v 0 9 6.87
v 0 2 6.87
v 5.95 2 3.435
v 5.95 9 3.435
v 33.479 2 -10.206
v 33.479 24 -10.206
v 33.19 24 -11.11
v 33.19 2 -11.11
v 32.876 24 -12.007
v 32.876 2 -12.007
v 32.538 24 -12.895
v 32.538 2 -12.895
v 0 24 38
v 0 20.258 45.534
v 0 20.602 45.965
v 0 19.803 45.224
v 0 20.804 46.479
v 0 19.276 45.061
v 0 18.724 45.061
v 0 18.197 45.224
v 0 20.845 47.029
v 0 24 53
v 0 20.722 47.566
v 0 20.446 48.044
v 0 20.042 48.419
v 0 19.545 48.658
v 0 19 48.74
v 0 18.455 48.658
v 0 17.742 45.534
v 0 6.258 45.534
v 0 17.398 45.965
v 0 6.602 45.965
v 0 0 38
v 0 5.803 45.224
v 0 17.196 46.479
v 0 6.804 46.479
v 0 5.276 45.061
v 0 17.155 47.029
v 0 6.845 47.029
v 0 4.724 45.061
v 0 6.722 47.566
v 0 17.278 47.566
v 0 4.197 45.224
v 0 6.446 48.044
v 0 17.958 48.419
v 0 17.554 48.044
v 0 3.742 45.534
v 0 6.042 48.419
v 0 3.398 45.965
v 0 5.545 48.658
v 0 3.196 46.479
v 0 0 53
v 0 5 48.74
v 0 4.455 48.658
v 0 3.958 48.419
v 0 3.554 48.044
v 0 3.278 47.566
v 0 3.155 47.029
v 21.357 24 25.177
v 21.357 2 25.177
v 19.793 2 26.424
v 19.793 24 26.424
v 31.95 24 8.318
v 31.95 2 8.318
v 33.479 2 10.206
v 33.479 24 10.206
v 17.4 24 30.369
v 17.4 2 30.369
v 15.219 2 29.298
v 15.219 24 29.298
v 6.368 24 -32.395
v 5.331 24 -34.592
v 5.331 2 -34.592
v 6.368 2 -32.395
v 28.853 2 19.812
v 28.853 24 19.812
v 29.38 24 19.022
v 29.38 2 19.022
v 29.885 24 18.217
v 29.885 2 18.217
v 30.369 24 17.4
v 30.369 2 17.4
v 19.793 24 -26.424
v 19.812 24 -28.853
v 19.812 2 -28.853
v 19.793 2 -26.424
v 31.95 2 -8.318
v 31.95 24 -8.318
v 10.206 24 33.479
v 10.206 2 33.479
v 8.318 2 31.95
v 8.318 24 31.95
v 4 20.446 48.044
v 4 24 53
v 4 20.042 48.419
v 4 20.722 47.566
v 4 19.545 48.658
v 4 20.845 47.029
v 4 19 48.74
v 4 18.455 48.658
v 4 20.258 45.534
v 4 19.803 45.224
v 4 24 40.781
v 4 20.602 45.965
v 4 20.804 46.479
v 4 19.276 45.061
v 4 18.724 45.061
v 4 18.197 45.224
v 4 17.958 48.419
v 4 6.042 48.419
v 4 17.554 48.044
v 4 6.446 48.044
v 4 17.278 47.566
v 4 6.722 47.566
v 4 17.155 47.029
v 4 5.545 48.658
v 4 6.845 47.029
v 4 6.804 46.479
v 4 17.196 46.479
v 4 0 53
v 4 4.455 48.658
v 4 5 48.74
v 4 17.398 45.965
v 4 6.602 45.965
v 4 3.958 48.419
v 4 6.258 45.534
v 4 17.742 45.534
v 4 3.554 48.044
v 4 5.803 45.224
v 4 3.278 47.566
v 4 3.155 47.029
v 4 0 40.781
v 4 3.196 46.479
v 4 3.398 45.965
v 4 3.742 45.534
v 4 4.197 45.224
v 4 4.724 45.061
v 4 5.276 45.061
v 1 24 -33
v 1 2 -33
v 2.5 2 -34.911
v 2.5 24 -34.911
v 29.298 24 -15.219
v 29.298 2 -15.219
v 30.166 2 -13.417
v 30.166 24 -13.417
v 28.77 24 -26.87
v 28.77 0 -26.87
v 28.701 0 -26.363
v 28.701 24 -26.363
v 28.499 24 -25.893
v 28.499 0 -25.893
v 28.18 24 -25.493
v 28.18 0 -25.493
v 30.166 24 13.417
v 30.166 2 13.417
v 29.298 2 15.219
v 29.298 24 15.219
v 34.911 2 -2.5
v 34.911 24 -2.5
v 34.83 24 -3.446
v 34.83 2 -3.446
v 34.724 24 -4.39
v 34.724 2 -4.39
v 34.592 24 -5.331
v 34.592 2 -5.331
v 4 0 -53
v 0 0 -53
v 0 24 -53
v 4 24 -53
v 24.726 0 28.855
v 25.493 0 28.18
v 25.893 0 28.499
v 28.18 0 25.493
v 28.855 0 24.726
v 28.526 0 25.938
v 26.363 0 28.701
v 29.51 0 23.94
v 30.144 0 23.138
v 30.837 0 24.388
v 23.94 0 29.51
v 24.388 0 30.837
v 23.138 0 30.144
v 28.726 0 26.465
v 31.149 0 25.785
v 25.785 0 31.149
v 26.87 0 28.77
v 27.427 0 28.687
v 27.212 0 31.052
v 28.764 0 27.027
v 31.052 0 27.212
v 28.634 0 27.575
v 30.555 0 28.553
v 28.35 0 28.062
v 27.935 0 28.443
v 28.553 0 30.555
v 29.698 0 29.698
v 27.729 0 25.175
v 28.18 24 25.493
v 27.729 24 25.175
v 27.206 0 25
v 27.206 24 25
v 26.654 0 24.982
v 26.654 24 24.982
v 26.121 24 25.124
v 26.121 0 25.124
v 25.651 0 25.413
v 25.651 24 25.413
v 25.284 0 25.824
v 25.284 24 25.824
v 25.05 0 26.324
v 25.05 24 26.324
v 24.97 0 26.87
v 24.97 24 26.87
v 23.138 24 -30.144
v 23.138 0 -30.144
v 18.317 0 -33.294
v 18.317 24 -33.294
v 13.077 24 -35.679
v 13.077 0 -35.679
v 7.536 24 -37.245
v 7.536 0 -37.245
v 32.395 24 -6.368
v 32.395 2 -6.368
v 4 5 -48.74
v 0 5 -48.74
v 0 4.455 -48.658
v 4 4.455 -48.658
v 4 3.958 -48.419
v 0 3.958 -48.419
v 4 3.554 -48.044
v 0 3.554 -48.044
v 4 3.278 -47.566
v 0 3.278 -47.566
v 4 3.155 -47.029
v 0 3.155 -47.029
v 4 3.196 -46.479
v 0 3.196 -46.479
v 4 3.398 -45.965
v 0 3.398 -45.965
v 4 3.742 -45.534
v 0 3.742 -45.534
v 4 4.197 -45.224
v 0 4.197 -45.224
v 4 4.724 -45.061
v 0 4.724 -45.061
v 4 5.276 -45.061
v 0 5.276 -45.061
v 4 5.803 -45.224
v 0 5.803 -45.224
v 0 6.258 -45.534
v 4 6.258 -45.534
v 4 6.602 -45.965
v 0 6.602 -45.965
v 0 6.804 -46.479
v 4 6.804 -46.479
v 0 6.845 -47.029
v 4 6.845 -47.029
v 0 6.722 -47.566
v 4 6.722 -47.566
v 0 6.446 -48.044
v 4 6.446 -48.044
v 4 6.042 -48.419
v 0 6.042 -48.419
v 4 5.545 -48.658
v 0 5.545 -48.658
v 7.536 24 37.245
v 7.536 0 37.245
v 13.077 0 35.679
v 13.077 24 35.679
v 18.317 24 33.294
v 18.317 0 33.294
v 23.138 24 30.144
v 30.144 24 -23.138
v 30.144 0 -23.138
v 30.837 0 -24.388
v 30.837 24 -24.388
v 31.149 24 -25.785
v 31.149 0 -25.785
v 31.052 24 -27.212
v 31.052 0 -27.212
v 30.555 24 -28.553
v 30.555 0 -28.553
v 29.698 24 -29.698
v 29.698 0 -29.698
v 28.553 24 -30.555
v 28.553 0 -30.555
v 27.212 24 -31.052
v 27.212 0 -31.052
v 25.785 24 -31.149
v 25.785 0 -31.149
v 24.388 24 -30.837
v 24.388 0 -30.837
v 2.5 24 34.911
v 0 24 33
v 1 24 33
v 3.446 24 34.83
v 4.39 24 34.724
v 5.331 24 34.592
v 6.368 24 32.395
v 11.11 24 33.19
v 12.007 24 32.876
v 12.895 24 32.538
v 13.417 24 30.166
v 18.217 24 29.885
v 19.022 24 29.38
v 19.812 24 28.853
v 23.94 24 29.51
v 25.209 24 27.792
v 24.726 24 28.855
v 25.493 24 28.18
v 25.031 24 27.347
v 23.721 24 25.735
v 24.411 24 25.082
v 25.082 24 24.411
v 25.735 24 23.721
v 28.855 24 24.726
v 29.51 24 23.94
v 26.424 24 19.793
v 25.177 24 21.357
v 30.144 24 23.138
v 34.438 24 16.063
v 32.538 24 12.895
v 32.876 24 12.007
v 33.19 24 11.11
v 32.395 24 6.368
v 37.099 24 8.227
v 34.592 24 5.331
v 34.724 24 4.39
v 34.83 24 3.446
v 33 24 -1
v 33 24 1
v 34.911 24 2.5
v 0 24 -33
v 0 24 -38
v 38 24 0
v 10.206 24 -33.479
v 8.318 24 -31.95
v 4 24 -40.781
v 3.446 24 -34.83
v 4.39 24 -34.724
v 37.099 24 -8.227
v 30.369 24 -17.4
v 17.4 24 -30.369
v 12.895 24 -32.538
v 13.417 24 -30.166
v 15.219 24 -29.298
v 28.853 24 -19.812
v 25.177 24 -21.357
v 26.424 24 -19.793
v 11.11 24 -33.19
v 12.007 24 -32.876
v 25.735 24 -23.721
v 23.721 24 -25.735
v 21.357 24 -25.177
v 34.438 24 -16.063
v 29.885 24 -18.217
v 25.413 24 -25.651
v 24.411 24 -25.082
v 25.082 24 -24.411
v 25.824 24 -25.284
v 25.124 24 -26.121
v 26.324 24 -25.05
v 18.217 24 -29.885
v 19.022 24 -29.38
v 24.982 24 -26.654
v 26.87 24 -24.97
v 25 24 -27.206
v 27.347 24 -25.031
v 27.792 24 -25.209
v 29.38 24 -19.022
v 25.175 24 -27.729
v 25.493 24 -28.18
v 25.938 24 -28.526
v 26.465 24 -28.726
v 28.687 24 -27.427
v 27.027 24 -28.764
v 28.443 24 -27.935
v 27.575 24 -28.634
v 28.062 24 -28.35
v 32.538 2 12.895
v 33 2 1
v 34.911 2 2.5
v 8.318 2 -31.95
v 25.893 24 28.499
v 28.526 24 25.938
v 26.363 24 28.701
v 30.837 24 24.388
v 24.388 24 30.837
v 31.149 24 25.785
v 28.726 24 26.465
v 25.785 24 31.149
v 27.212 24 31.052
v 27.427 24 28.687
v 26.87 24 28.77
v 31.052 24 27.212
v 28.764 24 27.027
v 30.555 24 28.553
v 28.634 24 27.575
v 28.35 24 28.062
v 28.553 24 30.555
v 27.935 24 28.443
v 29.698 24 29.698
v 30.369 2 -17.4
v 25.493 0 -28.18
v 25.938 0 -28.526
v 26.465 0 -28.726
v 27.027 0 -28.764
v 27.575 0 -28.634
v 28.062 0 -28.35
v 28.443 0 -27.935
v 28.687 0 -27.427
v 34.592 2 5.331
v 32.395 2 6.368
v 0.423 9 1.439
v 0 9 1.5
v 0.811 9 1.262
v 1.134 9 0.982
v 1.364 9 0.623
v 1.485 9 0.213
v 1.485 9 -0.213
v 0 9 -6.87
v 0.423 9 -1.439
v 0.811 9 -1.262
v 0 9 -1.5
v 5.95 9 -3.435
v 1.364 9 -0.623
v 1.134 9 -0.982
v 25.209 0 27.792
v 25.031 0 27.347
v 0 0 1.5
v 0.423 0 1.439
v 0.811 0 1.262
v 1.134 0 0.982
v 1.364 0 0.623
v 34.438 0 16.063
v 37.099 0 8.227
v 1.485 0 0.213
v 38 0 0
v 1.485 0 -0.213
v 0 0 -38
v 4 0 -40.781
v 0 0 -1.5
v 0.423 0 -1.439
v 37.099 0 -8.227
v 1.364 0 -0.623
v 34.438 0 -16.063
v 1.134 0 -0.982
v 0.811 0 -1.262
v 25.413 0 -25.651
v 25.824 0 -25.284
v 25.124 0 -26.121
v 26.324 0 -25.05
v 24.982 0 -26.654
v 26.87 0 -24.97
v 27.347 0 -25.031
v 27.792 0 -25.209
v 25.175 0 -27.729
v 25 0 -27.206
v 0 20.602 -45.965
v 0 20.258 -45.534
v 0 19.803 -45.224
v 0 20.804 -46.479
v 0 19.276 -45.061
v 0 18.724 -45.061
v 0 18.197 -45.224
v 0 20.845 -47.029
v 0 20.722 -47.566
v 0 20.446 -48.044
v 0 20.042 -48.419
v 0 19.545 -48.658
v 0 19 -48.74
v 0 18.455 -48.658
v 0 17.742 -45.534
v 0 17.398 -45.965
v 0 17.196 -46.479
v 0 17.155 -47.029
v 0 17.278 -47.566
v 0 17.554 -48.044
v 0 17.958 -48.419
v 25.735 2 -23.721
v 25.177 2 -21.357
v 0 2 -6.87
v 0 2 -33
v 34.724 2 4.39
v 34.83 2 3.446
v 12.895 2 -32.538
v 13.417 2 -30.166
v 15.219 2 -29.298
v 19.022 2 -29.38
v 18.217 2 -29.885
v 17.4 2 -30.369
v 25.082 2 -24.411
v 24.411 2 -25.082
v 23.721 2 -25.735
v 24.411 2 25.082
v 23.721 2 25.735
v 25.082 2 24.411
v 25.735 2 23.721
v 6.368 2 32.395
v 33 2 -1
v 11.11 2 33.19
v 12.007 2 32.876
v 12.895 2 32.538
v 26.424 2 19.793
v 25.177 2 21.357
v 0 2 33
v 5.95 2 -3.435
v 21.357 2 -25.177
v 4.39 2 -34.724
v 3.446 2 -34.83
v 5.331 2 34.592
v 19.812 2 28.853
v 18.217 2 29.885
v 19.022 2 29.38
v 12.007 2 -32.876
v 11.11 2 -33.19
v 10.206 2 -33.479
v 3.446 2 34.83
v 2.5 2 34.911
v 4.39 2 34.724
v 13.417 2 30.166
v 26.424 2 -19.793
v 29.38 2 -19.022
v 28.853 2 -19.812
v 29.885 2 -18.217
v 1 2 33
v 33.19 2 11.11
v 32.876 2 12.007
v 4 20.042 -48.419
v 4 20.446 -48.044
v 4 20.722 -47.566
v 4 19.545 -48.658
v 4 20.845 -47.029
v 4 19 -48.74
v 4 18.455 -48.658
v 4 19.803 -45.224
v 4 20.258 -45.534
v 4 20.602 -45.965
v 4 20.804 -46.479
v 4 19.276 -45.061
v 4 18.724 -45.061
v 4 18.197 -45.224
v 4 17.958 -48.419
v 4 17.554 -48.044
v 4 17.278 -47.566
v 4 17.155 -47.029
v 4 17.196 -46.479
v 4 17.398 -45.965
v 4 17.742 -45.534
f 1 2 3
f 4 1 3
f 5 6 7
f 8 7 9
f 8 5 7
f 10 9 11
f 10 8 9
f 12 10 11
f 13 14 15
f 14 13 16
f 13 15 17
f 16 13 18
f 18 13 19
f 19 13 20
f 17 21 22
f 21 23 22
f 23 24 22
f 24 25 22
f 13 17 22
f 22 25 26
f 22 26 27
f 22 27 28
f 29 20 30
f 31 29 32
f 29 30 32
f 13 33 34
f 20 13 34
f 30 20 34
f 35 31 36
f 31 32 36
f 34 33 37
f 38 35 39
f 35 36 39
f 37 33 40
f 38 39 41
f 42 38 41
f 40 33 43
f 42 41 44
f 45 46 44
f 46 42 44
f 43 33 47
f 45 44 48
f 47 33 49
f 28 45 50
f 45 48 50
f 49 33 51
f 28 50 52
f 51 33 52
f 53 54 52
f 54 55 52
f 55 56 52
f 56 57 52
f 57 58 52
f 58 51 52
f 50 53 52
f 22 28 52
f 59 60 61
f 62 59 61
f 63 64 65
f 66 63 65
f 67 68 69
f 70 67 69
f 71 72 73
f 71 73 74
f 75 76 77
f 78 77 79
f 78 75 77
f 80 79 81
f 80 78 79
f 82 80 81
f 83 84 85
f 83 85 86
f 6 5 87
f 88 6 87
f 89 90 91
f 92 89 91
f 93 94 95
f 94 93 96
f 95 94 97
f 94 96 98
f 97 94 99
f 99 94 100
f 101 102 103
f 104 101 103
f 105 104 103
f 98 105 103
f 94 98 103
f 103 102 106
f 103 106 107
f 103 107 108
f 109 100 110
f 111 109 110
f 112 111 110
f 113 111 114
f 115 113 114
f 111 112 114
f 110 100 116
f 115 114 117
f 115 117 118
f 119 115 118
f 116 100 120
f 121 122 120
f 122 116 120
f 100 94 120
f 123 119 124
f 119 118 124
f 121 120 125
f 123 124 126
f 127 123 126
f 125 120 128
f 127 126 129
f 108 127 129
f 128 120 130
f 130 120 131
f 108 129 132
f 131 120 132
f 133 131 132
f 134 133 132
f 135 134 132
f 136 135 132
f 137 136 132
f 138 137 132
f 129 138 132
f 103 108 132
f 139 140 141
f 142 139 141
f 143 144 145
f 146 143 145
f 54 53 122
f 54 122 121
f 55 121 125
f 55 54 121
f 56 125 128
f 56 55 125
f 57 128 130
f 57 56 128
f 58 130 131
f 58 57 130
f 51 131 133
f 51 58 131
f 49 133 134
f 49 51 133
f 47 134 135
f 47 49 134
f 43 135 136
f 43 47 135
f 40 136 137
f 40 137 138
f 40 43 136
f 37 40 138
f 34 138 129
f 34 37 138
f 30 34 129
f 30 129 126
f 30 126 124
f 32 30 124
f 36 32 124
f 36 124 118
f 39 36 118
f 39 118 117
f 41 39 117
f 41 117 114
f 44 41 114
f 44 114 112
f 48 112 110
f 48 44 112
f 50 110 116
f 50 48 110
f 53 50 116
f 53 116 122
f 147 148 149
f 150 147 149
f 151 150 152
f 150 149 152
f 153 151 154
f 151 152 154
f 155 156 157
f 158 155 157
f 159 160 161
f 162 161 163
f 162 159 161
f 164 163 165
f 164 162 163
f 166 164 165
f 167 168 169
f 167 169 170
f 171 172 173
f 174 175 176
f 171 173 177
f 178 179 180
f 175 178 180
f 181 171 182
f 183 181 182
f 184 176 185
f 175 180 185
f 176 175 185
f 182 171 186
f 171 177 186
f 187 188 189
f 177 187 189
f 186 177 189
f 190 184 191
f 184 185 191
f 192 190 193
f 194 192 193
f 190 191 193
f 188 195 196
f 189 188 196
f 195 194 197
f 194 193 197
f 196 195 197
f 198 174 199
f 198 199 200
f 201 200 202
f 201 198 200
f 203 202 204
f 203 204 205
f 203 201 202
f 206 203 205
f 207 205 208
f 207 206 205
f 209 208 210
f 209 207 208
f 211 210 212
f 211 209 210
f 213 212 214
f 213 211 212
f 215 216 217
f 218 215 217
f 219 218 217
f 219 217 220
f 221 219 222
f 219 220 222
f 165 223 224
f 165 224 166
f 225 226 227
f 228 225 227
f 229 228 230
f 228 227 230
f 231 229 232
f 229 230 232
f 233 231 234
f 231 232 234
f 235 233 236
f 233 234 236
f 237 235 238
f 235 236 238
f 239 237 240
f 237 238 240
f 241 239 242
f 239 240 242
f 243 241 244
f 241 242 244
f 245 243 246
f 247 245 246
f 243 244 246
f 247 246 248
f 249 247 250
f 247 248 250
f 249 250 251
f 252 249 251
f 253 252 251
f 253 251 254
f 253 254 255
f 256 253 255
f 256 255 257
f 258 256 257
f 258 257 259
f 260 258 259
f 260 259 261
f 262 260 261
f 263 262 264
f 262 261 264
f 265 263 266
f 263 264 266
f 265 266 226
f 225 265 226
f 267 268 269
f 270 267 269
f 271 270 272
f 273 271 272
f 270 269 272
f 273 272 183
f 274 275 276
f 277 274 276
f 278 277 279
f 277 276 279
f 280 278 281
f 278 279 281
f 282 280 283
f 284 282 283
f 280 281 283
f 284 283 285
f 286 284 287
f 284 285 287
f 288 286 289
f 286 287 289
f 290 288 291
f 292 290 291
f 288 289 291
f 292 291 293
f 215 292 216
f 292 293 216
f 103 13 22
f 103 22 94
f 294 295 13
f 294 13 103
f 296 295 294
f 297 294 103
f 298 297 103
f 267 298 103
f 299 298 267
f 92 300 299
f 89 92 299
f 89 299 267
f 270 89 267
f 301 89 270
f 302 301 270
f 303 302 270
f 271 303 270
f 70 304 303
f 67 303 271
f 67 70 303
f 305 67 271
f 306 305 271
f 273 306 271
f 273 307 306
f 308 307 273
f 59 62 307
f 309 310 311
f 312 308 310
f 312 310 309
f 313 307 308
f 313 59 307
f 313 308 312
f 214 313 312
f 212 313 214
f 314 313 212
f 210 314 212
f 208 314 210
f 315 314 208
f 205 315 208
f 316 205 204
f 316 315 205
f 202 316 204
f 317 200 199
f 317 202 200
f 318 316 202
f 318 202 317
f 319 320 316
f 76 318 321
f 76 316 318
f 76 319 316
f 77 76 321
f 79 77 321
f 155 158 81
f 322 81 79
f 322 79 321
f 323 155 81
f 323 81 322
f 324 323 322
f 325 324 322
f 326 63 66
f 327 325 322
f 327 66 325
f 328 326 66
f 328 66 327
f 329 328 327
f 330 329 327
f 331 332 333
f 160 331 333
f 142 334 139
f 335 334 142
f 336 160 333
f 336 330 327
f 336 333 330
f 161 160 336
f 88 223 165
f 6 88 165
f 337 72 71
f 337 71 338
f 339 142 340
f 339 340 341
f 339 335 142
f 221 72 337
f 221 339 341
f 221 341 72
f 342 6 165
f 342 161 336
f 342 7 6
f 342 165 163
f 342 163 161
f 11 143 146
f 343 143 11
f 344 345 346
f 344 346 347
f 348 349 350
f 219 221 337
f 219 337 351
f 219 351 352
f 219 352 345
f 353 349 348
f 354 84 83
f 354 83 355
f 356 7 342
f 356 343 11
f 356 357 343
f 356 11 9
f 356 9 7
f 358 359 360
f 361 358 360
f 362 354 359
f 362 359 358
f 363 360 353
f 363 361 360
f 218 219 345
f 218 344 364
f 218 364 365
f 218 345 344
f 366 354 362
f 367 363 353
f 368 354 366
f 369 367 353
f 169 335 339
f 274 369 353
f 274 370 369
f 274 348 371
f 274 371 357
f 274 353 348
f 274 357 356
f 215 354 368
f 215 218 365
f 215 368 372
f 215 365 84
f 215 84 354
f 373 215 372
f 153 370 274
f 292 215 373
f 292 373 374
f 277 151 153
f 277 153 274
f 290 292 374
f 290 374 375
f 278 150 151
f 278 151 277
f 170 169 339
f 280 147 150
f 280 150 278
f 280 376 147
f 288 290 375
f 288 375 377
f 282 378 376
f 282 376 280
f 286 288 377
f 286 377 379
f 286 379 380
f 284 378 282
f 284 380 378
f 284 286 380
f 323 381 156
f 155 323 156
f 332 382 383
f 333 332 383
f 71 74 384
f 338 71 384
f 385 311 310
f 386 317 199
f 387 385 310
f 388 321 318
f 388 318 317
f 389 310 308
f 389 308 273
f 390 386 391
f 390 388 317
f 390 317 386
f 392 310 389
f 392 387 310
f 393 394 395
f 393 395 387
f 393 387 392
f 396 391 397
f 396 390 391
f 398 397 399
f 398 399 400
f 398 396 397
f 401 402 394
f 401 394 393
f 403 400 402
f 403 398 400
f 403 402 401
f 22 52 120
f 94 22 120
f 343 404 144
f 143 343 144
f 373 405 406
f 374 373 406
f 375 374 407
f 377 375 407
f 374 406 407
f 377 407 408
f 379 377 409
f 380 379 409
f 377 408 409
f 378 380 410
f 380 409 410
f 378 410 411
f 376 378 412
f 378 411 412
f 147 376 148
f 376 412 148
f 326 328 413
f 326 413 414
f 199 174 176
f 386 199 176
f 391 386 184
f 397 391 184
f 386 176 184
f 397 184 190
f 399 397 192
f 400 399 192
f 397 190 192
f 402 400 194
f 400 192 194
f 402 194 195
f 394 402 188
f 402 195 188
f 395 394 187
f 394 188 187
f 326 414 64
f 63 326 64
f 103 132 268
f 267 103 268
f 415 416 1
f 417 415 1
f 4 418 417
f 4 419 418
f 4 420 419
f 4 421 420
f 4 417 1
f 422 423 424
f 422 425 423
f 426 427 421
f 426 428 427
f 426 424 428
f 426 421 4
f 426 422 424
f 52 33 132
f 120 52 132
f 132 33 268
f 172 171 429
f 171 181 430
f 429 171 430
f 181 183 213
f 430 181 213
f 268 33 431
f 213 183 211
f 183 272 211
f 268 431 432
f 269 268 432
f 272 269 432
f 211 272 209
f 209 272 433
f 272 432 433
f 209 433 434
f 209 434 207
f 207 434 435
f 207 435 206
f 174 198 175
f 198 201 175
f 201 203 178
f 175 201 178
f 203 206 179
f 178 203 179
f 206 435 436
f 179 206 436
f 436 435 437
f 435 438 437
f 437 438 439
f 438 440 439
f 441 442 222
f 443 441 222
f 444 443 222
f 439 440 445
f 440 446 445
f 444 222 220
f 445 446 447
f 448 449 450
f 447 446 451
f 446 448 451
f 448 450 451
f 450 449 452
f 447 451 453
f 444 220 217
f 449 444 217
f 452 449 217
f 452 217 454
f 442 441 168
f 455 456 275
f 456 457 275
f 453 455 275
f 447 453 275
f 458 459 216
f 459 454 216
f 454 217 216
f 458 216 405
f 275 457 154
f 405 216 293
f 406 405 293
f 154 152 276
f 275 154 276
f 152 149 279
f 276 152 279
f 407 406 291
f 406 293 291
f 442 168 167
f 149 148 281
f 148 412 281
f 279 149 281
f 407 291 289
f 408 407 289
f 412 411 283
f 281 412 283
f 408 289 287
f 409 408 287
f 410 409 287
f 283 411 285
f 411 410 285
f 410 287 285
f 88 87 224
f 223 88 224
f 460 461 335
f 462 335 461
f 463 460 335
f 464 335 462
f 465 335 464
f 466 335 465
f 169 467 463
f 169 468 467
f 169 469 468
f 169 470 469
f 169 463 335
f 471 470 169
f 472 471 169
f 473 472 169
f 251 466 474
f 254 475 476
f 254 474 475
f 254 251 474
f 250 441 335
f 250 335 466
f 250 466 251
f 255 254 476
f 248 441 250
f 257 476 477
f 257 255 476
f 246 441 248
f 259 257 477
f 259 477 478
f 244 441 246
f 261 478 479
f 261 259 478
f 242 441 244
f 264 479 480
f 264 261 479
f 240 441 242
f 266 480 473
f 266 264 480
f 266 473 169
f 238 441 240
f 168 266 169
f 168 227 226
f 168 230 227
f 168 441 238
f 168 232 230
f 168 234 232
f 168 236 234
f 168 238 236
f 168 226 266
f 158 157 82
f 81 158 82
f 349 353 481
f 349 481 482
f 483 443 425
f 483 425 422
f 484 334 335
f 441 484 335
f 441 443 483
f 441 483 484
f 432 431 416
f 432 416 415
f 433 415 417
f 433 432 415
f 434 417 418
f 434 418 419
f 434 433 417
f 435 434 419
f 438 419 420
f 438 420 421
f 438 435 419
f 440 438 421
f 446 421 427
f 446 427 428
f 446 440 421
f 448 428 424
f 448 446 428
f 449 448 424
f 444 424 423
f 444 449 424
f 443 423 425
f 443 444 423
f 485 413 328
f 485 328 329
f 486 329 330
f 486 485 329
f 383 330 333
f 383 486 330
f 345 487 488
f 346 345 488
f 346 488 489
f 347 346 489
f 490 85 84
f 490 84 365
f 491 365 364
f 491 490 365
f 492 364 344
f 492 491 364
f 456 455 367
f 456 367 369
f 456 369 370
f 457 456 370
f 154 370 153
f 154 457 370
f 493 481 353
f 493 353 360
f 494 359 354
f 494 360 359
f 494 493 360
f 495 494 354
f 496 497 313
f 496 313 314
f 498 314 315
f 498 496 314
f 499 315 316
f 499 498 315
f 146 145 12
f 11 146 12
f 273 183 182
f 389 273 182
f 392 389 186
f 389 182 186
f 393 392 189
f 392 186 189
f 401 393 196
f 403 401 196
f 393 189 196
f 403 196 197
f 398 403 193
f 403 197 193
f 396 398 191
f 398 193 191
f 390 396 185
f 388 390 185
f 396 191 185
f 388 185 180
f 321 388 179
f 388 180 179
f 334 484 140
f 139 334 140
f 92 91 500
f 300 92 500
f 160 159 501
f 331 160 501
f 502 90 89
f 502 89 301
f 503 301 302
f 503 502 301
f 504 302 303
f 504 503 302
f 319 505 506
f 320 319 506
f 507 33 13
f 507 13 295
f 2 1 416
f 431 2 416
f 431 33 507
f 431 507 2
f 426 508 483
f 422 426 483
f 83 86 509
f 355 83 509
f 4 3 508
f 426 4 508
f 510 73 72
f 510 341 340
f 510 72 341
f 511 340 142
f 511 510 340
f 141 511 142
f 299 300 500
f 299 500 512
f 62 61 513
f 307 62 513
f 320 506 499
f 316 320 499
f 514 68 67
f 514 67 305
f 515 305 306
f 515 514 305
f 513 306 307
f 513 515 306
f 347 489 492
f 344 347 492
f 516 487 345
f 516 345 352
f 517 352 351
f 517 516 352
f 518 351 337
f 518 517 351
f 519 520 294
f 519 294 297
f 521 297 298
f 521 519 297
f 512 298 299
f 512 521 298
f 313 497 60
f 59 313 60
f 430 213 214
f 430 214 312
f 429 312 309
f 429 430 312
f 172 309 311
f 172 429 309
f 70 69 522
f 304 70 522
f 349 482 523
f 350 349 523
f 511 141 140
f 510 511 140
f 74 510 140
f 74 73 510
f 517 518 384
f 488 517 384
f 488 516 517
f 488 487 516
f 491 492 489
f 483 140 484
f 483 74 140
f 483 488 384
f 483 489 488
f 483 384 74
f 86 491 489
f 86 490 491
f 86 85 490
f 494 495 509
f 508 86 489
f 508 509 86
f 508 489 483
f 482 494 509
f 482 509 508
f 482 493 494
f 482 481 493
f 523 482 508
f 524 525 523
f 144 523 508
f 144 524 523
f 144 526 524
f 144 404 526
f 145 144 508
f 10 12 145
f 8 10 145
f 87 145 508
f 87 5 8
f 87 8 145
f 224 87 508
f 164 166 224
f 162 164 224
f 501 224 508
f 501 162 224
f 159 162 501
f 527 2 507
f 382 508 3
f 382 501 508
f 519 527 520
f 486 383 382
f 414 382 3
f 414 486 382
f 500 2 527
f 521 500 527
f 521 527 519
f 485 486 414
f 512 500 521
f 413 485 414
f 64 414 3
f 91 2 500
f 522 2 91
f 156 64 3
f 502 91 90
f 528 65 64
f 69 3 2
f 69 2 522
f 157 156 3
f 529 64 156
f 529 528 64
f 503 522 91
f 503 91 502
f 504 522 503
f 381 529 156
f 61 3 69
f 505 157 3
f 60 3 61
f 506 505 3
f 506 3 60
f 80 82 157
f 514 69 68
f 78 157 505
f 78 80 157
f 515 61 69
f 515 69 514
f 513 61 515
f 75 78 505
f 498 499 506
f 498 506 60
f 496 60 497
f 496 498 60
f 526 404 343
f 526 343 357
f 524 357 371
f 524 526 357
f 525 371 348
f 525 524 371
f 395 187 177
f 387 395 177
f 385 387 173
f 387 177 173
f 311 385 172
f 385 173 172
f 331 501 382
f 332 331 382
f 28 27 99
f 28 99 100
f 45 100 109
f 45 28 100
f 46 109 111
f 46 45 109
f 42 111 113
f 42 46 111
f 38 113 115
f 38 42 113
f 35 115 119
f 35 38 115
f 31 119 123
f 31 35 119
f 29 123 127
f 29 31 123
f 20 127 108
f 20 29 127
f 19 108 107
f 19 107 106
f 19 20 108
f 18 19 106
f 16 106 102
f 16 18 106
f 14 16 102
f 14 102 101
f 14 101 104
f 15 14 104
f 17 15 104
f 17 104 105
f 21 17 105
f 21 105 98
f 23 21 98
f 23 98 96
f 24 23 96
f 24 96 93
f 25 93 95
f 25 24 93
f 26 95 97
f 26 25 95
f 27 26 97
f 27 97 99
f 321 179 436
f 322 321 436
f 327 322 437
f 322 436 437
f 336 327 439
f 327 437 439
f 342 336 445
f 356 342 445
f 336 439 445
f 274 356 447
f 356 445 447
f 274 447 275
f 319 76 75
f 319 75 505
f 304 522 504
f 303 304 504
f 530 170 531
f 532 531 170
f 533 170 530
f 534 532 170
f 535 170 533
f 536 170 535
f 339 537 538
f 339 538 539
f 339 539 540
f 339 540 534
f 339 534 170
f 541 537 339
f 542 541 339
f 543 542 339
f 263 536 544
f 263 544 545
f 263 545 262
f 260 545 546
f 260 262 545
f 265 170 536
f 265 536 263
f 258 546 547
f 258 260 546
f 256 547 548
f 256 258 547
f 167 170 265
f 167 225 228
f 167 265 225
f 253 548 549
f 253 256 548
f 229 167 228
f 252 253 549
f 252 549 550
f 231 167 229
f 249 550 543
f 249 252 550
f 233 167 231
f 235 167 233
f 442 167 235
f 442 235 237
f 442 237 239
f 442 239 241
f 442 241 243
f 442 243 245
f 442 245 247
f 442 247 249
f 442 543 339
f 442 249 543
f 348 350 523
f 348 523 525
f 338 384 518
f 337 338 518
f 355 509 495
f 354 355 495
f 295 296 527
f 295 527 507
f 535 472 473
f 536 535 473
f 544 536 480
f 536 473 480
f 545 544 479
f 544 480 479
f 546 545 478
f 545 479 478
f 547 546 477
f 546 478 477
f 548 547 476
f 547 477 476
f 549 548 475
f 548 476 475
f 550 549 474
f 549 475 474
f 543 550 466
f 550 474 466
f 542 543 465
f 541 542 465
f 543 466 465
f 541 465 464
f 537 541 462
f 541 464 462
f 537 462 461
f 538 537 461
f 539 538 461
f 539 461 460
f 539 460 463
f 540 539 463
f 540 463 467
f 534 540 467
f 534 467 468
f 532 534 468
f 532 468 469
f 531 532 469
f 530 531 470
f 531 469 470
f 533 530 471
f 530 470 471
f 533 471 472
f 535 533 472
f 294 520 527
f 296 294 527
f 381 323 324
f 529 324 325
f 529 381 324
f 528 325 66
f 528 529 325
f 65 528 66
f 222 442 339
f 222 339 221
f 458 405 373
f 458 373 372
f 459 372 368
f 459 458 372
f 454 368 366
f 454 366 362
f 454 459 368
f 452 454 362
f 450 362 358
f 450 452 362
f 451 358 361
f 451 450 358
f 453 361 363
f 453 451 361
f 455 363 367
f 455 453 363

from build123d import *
from build123d.topology import SkipClean

# Parameters (mm, degrees)
SKETCH1_R            = 38
SKETCH1_R_2          = 35
SKETCH1_R_3          = 2
BOSS_EXTRUDE6_DEPTH  = 2
SKETCH1_7_R          = 38
SKETCH1_7_R_2        = 35
BOSS_EXTRUDE7_DEPTH  = 24
BOSS_EXTRUDE8_DEPTH  = 24
CIRPATTERN1_COUNT    = 28
BOSS_EXTRUDE9_DEPTH  = 24
SKETCH4_R            = 1.85
CUT_EXTRUDE2_DEPTH   = 4
BOSS_EXTRUDE12_DEPTH = 9
SKETCH7_R            = 1.5
CUT_EXTRUDE4_DEPTH   = 9
BOSS_EXTRUDE17_DEPTH = 24
SKETCH11_10_R        = 1.9
CUT_EXTRUDE7_DEPTH   = 24
CIRPATTERN2_COUNT    = 4
SKETCH5_W            = 41.086585788
SKETCH5_H            = 115.80999181
CUT_EXTRUDE3_DEPTH   = 24


with BuildPart() as part:
    # Sketch1 → Boss-Extrude6 (new body)
    # profile 1 of 5: a face of its own
    with BuildSketch(Plane(origin=(0, 0, 0), x_dir=(1, 0, 0), z_dir=(0, 1, 0))):
        with Locations(Location((0, 0, 0), (0, 0, 270))):
            Circle(SKETCH1_R)
        Circle(SKETCH1_R_2, mode=Mode.SUBTRACT)
    # profile 2 of 5: a face of its own
    with BuildSketch(Plane(origin=(0, 0, 0), x_dir=(1, 0, 0), z_dir=(0, 1, 0))):
        with BuildLine():
            Line((1, 33), (0, 33))
            Line((0, 33), (-1, 33))
            Line((-1, 33), (-2.5, 34.910600109))
            ThreePointArc((-2.5, 34.910600109), (-23.848480035, -25.617376915), (35, 0))
            ThreePointArc((35, 0), (25.617376915, 23.848480035), (2.5, 34.910600109))
            Line((2.5, 34.910600109), (1, 33))
        make_face()
        Circle(SKETCH1_R_3, mode=Mode.SUBTRACT)
    # profile 3 of 5: a face of its own
    with BuildSketch(Plane(origin=(0, 0, 0), x_dir=(1, 0, 0), z_dir=(0, 1, 0))):
        Circle(SKETCH1_R_3)
    # profile 4 of 5: a face of its own
    with BuildSketch(Plane(origin=(0, 0, 0), x_dir=(1, 0, 0), z_dir=(0, 1, 0))):
        with BuildLine():
            Line((0, 33), (0, 35))
            ThreePointArc((0, 35), (-1.250798979, 34.977642887), (-2.5, 34.910600109))
            Line((-2.5, 34.910600109), (-1, 33))
            Line((-1, 33), (0, 33))
        make_face()
    # profile 5 of 5: a face of its own
    with BuildSketch(Plane(origin=(0, 0, 0), x_dir=(1, 0, 0), z_dir=(0, 1, 0))):
        with BuildLine():
            ThreePointArc((2.5, 34.910600109), (1.250798979, 34.977642887), (0, 35))
            Line((0, 35), (0, 33))
            Line((0, 33), (1, 33))
            Line((1, 33), (2.5, 34.910600109))
        make_face()
    extrude(amount=BOSS_EXTRUDE6_DEPTH)

    # Sketch1<7> → Boss-Extrude7 (add)
    with BuildSketch(Plane(origin=(0, 0, 0), x_dir=(1, 0, 0), z_dir=(0, 1, 0))):
        with Locations(Location((0, 0, 0), (0, 0, 270))):
            Circle(SKETCH1_7_R)
        with Locations(Location((0, 0, 0), (0, 0, 270))):
            Circle(SKETCH1_7_R_2, mode=Mode.SUBTRACT)
    extrude(amount=BOSS_EXTRUDE7_DEPTH)

    # Sketch1<8> → Boss-Extrude8 (add)
    with BuildSketch(Plane(origin=(0, 0, 0), x_dir=(1, 0, 0), z_dir=(0, 1, 0))):
        with BuildLine():
            ThreePointArc((2.5, 34.910600109), (1.250798979, 34.977642887), (0, 35))
            Line((0, 35), (0, 33))
            Line((0, 33), (1, 33))
            Line((1, 33), (2.5, 34.910600109))
        make_face()
        with BuildLine():
            Line((0, 33), (0, 35))
            ThreePointArc((0, 35), (-1.250798979, 34.977642887), (-2.5, 34.910600109))
            Line((-2.5, 34.910600109), (-1, 33))
            Line((-1, 33), (0, 33))
        make_face()
    boss_extrude8 = extrude(amount=BOSS_EXTRUDE8_DEPTH)

    # CirPattern1: Boss-Extrude8 ×28 about axis
    cirpattern1_axis = Axis((0, 0, 0), (0, 1, 0))
    for i in range(1, CIRPATTERN1_COUNT):
        add(boss_extrude8.rotate(cirpattern1_axis, i * 360 / CIRPATTERN1_COUNT))

    # Sketch3 → Boss-Extrude9 (add)
    with BuildSketch(Plane(origin=(0, 0, 0), x_dir=(1, 0, 0), z_dir=(0, 1, 0))):
        with BuildLine():
            Line((0, -38), (0, -53))
            Line((0, -53), (4, -53))
            Line((4, -53), (4, -40.780878967))
            Line((4, -40.780878967), (7.535533906, -37.245345062))
            ThreePointArc((7.535533906, -37.245345062), (3.786613768, -37.810865583), (0, -38))
        make_face()
    boss_extrude9 = extrude(amount=BOSS_EXTRUDE9_DEPTH)

    # Sketch4 → Cut-Extrude2 (cut)
    with BuildSketch(Plane(origin=(0, 0, 0), x_dir=(0, 0, -1), z_dir=(1, 0, 0))):
        with Locations(Location((-46.890439484, 5, 0), (0, 0, 180))):
            Circle(SKETCH4_R)
        with Locations(Location((-46.890439484, 19, 0), (0, 0, 180))):
            Circle(SKETCH4_R)
    cut_extrude2 = extrude(amount=CUT_EXTRUDE2_DEPTH, mode=Mode.SUBTRACT)

    # Mirror1: Boss-Extrude9, Cut-Extrude2 across plane
    add(boss_extrude9.mirror(Plane.XY))
    add(cut_extrude2.mirror(Plane.XY), mode=Mode.SUBTRACT)

    # Sketch6 → Boss-Extrude12 (add)
    with BuildSketch(Plane(origin=(0, 0, 0), x_dir=(1, 0, 0), z_dir=(0, 1, 0))):
        Polygon((0, 6.870468203), (-5.95, 3.435234102), (-5.95, -3.435234102), (0, -6.870468203), (5.95, -3.435234102), (5.95, 3.435234102), align=None)
    extrude(amount=BOSS_EXTRUDE12_DEPTH)

    # Sketch7 → Cut-Extrude4 (cut)
    with BuildSketch(Plane(origin=(0, 0, 0), x_dir=(1, 0, 0), z_dir=(0, 1, 0))):
        with Locations(Location((0, 0, 0), (0, 0, 270))):
            Circle(SKETCH7_R)
    extrude(amount=CUT_EXTRUDE4_DEPTH, mode=Mode.SUBTRACT)

    # Sketch11 → Boss-Extrude17 (add)
    with BuildSketch(Plane(origin=(0, 0, 0), x_dir=(1, 0, 0), z_dir=(0, 1, 0))):
        with BuildLine():
            ThreePointArc((25.493387139, 28.179553087), (27.575155537, 28.634381073), (28.770057685, 26.870057685))
            ThreePointArc((28.770057685, 26.870057685), (28.61620219, 26.121072126), (28.179553087, 25.493387139))
            ThreePointArc((28.179553087, 25.493387139), (29.185469438, 24.335331798), (30.143828836, 23.137622676))
            ThreePointArc((30.143828836, 23.137622676), (29.69848481, 29.69848481), (23.137622676, 30.143828836))
            ThreePointArc((23.137622676, 30.143828836), (24.335331798, 29.185469438), (25.493387139, 28.179553087))
        make_face()
    boss_extrude17 = extrude(amount=BOSS_EXTRUDE17_DEPTH)

    # Sketch11<10> → Cut-Extrude7 (cut)
    with SkipClean():  # the faces are left unmerged after this step: merging them gives an invalid solid
        with BuildSketch(Plane(origin=(0, 0, 0), x_dir=(1, 0, 0), z_dir=(0, 1, 0))):
            with Locations(Location((26.870057685, 26.870057685, 0), (0, 0, 270))):
                Circle(SKETCH11_10_R)
        cut_extrude7 = extrude(amount=CUT_EXTRUDE7_DEPTH, mode=Mode.SUBTRACT)

    # CirPattern2: Boss-Extrude17, Cut-Extrude7 ×4 about axis
    with SkipClean():  # the faces are left unmerged after this step: merging them gives an invalid solid
        cirpattern2_axis = Axis((0, 0, 0), (0, 1, 0))
        add([boss_extrude17.rotate(cirpattern2_axis, i * 360 / CIRPATTERN2_COUNT) for i in range(1, CIRPATTERN2_COUNT)])
        add([cut_extrude7.rotate(cirpattern2_axis, i * 360 / CIRPATTERN2_COUNT) for i in range(1, CIRPATTERN2_COUNT)], mode=Mode.SUBTRACT)

    # Sketch5 → Cut-Extrude3 (cut)
    with SkipClean():  # the faces are left unmerged after this step: merging them gives an invalid solid
        with BuildSketch(Plane(origin=(0, 0, 0), x_dir=(1, 0, 0), z_dir=(0, 1, 0))):
            with Locations((-20.543292894, -1.918879007)):
                Rectangle(SKETCH5_W, SKETCH5_H)
        extrude(amount=CUT_EXTRUDE3_DEPTH, mode=Mode.SUBTRACT)


solid = part.part
